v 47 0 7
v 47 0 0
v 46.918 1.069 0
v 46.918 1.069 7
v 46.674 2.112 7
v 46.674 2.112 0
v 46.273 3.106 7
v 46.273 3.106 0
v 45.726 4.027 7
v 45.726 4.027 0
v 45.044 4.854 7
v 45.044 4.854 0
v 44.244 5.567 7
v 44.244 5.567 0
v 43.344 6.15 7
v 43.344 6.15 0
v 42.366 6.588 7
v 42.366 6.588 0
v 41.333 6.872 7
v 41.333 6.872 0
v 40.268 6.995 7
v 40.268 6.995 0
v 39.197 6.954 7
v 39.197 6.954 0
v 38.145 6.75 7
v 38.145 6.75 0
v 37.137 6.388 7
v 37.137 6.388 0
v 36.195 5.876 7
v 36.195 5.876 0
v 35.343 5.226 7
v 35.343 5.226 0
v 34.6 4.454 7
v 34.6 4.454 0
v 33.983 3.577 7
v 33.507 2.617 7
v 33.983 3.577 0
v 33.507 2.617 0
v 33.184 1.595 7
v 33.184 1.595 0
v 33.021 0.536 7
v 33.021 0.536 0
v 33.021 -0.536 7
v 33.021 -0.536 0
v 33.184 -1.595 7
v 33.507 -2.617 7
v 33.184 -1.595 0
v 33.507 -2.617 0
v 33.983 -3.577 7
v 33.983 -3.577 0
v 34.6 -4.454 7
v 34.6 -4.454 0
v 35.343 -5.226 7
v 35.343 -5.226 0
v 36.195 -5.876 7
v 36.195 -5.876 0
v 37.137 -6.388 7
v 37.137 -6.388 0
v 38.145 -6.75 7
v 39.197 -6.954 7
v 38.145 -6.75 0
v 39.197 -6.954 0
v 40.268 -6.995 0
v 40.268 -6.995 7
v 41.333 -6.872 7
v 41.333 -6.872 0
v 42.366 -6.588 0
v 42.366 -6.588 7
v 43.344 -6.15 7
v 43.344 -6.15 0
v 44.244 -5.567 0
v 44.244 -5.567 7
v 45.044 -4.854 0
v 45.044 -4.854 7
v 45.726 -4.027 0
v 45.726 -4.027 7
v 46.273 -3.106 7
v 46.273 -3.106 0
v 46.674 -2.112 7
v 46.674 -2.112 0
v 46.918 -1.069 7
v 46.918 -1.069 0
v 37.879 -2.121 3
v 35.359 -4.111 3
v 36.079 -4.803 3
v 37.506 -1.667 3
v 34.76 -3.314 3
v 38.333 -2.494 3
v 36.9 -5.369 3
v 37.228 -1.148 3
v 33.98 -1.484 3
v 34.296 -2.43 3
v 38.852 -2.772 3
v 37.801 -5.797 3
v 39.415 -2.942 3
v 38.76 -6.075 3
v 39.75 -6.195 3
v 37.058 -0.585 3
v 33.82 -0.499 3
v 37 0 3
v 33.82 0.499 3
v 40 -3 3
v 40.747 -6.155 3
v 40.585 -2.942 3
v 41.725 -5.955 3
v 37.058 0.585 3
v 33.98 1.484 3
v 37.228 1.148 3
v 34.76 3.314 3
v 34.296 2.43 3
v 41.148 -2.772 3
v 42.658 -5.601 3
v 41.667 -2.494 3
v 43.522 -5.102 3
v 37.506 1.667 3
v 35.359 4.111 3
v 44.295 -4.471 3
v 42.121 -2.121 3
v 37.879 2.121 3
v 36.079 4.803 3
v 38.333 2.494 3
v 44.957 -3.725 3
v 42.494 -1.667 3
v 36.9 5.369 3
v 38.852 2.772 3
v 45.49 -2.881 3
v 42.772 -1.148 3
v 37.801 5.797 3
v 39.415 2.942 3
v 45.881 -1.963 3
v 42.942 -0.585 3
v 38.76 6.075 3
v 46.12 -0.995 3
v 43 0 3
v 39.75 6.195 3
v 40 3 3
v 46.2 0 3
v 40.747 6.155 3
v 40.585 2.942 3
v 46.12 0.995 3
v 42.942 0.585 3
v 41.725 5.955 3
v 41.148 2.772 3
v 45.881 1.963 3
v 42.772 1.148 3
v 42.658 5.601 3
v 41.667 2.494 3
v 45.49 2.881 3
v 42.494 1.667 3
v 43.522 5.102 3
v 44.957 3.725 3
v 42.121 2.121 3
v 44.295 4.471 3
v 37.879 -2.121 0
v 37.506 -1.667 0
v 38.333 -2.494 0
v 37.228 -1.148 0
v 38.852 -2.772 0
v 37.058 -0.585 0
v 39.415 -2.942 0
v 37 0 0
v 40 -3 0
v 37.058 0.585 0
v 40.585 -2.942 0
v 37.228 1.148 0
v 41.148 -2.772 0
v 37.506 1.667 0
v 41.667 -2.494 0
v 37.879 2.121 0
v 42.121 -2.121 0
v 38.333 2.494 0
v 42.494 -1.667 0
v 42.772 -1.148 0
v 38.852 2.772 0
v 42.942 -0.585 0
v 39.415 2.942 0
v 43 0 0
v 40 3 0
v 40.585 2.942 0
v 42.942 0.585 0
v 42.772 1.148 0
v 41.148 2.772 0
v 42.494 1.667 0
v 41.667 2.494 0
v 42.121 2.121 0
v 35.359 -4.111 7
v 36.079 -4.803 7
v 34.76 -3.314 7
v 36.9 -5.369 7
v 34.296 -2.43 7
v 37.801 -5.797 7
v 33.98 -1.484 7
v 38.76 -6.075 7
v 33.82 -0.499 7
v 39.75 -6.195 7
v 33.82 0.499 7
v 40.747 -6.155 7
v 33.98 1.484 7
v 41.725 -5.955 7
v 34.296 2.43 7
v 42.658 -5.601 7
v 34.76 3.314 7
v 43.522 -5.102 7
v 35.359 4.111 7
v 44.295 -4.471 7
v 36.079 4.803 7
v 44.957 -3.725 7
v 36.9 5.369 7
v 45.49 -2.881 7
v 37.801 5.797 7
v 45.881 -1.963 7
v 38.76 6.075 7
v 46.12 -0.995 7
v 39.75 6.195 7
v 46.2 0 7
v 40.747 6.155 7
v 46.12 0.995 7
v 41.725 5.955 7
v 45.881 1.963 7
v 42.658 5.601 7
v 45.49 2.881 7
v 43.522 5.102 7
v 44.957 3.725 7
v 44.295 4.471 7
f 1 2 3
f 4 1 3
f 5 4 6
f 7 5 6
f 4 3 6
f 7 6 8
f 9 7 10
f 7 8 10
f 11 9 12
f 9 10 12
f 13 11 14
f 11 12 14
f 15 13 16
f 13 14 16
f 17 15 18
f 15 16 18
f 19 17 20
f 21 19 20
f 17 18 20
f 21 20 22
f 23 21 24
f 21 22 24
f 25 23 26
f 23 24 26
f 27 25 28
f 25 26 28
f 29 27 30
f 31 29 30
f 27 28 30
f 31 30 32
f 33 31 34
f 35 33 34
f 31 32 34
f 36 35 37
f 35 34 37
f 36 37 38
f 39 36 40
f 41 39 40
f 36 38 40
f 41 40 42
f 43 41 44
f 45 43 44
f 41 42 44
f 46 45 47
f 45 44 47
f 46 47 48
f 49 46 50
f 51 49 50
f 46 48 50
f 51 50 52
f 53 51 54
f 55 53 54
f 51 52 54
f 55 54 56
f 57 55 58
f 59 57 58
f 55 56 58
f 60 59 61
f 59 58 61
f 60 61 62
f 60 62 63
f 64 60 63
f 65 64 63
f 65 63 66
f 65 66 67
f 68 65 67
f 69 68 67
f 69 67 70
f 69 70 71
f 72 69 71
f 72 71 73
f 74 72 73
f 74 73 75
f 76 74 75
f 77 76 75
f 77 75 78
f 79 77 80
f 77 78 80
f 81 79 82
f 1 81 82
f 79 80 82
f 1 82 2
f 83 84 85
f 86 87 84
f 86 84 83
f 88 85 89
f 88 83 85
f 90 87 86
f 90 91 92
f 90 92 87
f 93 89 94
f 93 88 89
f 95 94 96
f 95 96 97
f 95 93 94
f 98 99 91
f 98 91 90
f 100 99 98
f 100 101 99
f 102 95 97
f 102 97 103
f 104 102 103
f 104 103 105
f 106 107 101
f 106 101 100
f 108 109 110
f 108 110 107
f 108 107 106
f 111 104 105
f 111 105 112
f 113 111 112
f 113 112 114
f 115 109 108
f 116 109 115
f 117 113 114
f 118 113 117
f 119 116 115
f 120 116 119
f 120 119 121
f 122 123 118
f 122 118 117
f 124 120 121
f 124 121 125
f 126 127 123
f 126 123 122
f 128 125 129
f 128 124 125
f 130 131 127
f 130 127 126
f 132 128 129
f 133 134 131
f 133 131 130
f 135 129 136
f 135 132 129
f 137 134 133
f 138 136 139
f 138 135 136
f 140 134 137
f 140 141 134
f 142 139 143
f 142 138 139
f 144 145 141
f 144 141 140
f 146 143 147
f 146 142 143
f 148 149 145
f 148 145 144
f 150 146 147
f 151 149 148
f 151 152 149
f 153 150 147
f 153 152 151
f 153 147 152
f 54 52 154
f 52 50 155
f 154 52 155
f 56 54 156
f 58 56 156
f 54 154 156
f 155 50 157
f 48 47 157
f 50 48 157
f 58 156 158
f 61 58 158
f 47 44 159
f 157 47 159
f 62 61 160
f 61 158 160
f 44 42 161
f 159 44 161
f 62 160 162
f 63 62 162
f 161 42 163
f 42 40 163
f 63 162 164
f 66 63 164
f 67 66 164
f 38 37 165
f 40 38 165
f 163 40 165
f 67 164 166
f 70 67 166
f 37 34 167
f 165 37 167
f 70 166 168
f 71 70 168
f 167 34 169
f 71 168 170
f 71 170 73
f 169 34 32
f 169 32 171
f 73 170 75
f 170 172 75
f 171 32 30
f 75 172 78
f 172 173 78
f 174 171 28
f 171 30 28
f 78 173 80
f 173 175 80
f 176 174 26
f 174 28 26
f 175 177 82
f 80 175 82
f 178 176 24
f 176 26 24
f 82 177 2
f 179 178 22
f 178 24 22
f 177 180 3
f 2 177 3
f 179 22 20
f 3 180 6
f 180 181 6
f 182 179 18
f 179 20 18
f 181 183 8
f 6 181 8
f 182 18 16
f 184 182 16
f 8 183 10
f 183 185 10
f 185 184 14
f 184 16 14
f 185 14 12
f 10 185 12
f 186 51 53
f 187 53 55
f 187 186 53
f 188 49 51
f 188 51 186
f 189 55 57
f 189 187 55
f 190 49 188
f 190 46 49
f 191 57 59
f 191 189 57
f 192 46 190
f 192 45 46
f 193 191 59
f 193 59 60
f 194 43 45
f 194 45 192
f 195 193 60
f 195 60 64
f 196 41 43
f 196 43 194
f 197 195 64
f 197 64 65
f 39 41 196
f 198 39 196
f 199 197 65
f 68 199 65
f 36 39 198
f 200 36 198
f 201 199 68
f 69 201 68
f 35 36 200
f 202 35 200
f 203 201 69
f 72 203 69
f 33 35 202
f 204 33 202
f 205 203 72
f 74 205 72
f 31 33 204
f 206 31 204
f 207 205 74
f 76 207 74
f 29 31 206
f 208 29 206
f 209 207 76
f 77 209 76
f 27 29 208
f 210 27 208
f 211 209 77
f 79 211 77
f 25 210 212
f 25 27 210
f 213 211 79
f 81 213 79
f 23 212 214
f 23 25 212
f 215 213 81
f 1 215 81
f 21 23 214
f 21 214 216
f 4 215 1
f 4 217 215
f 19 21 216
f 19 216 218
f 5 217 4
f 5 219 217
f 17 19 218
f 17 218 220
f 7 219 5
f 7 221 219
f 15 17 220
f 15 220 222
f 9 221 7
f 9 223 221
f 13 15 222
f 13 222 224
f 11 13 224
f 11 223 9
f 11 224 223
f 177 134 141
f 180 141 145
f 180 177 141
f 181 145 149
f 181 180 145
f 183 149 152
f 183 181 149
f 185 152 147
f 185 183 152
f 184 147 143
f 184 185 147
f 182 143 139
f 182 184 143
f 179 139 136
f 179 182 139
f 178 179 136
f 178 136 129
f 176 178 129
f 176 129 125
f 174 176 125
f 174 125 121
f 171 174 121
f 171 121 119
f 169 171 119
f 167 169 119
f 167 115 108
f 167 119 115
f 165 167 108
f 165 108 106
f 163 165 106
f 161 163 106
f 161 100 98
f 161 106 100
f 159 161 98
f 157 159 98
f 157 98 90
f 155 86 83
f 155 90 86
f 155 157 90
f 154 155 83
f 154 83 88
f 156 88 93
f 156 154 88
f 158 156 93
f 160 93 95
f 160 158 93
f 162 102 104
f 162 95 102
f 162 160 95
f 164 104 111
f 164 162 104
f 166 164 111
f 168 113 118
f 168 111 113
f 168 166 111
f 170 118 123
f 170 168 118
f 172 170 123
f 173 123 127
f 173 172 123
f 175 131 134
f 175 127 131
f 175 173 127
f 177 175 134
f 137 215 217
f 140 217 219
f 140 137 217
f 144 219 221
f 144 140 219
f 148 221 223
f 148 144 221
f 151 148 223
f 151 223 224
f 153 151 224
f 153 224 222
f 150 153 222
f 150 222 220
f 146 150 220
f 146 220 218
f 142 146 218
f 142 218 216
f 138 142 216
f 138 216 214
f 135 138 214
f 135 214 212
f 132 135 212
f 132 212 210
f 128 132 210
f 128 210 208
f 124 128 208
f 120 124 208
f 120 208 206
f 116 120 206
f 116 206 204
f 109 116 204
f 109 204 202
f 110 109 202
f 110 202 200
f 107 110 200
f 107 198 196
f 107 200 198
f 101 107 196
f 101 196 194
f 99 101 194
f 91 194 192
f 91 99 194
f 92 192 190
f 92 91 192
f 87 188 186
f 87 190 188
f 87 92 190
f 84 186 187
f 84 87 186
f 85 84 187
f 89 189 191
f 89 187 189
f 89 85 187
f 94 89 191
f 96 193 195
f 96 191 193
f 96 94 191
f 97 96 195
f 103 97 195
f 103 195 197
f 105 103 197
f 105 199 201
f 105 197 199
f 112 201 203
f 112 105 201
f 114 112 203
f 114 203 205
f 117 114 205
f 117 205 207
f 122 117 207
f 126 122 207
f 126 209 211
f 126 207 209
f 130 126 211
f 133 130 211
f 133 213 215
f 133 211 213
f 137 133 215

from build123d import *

# Parameters (mm, degrees)
CYLINDER018_R     = 6.2
CYLINDER018_DEPTH = 5
TUBE_R            = 7
TUBE_R_2          = 3
TUBE_DEPTH        = 7


with BuildPart() as cylinder:
    # Cylinder018 → Cylinder018 (new body)
    with BuildSketch(Plane(origin=(40, 0, 3), x_dir=(1, 0, 0), z_dir=(0, 0, 1))):
        Circle(CYLINDER018_R)
    extrude(amount=CYLINDER018_DEPTH)


with BuildPart() as captmp:
    # Tube → Tube (new body)
    with BuildSketch(Plane(origin=(40, 0, 0), x_dir=(1, 0, 0), z_dir=(0, 0, 1))):
        Circle(TUBE_R)
        Circle(TUBE_R_2, mode=Mode.SUBTRACT)
    extrude(amount=TUBE_DEPTH)

    # Cut011: cut Cylinder
    add(cylinder.part, mode=Mode.SUBTRACT)


solid = captmp.part
